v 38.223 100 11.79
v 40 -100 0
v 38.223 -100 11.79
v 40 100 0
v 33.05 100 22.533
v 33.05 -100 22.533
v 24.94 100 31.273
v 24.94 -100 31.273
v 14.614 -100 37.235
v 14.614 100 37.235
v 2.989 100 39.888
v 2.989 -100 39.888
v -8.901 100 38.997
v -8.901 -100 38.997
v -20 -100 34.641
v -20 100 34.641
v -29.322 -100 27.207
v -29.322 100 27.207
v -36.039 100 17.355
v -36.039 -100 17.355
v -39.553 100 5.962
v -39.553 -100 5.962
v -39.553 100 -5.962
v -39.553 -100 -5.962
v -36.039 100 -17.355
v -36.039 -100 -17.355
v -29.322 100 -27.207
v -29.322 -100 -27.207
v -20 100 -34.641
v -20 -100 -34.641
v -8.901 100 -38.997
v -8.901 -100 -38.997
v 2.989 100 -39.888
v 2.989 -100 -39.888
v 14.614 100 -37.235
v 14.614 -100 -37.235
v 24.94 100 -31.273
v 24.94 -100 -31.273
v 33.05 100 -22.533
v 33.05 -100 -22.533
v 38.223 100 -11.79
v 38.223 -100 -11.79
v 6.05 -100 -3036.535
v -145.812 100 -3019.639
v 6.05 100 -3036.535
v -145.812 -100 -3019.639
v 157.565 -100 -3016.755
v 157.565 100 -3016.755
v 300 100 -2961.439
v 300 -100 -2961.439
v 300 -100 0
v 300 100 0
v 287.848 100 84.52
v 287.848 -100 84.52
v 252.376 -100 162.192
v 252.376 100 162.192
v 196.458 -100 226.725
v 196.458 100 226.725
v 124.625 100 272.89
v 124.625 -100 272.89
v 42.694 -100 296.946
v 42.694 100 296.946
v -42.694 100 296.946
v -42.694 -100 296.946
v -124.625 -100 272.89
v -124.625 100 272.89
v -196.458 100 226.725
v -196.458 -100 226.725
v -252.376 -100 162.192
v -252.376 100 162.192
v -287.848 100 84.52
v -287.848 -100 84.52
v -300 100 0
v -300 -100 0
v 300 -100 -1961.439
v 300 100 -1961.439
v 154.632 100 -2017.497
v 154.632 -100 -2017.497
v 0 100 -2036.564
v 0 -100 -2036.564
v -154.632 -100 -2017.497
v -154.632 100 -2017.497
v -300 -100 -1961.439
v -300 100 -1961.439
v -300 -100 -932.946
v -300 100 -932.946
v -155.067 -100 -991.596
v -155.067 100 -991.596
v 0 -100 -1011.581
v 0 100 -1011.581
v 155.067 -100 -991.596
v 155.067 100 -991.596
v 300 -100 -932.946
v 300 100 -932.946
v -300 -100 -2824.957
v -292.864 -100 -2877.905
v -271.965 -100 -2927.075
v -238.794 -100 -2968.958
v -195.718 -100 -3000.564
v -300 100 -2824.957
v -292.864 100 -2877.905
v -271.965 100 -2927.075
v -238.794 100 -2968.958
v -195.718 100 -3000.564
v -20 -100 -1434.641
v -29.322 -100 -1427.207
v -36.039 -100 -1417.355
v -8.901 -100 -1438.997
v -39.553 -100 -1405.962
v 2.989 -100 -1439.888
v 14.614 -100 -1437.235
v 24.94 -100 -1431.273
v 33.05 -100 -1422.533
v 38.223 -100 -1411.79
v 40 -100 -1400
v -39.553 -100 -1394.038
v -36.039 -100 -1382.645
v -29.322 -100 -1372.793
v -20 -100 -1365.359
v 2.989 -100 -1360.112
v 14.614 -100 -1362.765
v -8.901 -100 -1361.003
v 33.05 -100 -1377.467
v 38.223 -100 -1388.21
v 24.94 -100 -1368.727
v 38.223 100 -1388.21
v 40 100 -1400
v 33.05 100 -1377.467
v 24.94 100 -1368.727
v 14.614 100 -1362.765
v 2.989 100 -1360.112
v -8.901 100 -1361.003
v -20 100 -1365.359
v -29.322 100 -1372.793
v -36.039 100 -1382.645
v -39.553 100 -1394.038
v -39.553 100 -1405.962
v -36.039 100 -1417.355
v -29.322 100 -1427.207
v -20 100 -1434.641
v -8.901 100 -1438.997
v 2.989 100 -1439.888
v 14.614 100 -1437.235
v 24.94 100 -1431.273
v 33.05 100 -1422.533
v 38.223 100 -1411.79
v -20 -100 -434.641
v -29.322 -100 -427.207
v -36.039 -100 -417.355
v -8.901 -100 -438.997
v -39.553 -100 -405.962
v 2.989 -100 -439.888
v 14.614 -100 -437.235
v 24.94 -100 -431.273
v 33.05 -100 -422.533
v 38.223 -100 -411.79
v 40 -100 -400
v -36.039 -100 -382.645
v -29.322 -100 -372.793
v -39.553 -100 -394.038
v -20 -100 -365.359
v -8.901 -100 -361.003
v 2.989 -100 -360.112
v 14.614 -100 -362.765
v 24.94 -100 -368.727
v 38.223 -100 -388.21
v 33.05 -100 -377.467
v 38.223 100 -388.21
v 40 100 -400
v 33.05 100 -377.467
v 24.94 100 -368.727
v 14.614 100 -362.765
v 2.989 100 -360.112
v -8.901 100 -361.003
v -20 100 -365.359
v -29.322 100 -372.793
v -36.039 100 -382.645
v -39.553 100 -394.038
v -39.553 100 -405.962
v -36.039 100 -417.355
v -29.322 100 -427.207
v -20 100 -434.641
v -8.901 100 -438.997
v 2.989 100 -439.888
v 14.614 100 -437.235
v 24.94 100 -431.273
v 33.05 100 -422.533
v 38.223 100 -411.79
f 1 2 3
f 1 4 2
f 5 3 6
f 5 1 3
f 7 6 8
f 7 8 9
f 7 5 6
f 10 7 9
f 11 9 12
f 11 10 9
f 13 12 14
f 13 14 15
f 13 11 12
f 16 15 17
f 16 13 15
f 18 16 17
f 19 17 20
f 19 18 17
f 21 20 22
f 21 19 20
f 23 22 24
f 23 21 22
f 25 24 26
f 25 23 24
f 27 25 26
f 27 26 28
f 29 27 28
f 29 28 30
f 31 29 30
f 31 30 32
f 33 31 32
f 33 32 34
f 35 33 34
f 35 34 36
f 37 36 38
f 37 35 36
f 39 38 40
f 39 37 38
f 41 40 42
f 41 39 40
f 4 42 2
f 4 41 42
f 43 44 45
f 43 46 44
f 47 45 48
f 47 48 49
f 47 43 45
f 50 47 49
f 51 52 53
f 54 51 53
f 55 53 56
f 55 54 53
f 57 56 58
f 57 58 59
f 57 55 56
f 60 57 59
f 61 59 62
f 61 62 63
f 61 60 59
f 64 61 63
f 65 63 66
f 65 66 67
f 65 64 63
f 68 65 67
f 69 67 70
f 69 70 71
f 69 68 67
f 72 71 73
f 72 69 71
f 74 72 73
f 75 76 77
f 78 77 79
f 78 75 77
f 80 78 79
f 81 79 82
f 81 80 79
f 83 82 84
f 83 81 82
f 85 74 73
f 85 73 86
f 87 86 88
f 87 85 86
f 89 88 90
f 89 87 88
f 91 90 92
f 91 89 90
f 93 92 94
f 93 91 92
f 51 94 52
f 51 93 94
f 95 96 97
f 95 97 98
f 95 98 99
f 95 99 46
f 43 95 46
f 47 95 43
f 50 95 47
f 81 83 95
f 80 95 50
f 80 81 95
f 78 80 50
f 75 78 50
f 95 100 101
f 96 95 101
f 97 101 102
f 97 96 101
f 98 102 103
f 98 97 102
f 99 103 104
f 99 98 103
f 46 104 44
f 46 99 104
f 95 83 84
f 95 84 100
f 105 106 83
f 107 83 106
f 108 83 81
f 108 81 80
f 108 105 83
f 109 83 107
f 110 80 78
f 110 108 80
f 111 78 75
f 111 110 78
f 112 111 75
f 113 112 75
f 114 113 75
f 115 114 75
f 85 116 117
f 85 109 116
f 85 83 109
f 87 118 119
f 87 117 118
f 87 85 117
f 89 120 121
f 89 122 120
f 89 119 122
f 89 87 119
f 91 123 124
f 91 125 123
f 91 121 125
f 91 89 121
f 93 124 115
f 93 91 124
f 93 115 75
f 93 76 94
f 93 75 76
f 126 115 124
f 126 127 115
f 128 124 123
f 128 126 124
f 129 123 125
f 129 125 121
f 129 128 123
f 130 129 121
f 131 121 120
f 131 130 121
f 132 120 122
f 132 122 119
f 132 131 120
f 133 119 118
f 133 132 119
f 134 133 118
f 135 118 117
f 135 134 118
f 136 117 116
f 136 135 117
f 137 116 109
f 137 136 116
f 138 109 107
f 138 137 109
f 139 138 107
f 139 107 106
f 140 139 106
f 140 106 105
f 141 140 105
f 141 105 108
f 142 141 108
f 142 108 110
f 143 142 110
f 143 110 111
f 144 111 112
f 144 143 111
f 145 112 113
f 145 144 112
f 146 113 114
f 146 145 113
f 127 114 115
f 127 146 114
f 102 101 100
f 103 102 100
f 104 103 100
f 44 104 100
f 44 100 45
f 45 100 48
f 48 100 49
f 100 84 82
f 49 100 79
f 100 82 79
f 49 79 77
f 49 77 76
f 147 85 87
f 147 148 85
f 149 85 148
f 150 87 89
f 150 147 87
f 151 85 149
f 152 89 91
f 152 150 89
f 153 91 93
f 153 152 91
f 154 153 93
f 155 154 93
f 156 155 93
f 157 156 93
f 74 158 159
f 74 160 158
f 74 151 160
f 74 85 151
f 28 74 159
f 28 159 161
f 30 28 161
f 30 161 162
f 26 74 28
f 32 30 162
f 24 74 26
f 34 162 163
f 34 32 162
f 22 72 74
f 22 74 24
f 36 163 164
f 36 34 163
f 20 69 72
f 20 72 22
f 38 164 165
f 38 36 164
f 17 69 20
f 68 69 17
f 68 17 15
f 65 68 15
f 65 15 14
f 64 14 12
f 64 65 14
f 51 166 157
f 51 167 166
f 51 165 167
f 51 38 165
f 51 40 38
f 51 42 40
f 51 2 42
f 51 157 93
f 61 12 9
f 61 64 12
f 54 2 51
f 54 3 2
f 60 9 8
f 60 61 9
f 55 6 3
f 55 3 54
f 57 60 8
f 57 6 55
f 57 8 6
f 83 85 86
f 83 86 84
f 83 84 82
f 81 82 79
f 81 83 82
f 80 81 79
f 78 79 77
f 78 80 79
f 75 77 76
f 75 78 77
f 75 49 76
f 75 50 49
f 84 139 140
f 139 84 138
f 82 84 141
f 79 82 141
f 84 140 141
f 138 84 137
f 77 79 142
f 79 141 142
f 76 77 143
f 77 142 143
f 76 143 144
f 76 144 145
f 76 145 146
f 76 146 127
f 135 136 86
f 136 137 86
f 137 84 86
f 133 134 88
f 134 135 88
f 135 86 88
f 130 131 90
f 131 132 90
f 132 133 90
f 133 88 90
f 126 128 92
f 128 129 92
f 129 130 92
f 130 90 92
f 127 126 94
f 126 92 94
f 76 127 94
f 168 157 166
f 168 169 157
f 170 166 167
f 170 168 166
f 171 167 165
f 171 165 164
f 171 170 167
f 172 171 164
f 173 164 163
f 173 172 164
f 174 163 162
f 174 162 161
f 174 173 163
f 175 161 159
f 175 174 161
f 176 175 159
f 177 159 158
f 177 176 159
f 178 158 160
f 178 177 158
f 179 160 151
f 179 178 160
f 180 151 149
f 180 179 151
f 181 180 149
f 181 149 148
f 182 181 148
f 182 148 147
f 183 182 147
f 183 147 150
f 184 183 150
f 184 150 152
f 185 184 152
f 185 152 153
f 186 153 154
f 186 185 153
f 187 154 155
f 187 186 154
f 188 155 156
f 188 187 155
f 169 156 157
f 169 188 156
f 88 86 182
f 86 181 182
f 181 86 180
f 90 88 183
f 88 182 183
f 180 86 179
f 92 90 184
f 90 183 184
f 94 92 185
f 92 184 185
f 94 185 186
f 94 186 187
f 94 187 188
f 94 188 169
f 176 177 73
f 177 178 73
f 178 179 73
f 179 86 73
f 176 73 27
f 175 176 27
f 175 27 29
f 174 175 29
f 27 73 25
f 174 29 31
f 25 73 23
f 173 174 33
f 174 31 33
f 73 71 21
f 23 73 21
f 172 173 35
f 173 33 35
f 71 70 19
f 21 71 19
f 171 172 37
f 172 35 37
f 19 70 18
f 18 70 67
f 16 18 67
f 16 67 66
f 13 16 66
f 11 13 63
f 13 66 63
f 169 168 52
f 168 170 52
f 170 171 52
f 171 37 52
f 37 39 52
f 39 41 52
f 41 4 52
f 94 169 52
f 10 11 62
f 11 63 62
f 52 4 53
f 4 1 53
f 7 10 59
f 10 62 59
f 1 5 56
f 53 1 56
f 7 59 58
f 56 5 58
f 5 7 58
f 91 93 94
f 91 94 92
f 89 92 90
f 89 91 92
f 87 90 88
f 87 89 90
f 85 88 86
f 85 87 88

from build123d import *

# Parameters (mm, degrees)
F0_R     = 40
F1_DEPTH = 100
F2_DEPTH = 100
F3_DEPTH = 100


with BuildPart() as f1:
    # F0 (on Front) → F1 (new body, symmetric)
    with BuildSketch(Plane.XZ):
        with BuildLine():
            Line((300, -932.945894), (300, 0))
            ThreePointArc((300, 0), (0, 300), (-300, 0))
            Line((-300, 0), (-300, -932.945894))
            ThreePointArc((-300, -932.945894), (0, -1011.581005), (300, -932.945894))
        make_face()
        with Locations((0, -400)):
            Circle(F0_R, mode=Mode.SUBTRACT)
        Circle(F0_R, mode=Mode.SUBTRACT)
    extrude(amount=F1_DEPTH, both=True)


with BuildPart() as f2:
    # F0 (on Front) → F2 (new body, symmetric)
    with BuildSketch(Plane.XZ):
        with BuildLine():
            Line((300, -1961.438973), (300, -932.945894))
            ThreePointArc((300, -932.945894), (0, -1011.581005), (-300, -932.945894))
            Line((-300, -932.945894), (-300, -1961.438973))
            ThreePointArc((-300, -1961.438973), (0, -2036.563995), (300, -1961.438973))
        make_face()
        with Locations((0, -1400)):
            Circle(F0_R, mode=Mode.SUBTRACT)
    extrude(amount=F2_DEPTH, both=True)


with BuildPart() as f3:
    # F0 (on Front) → F3 (new body, symmetric)
    with BuildSketch(Plane.XZ):
        with BuildLine():
            Line((300, -2961.438973), (300, -1961.438973))
            ThreePointArc((300, -1961.438973), (0, -2036.563995), (-300, -1961.438973))
            Line((-300, -1961.438973), (-300, -2824.956612))
            ThreePointArc((-300, -2824.956612), (-256.784023, -2949.128953), (-145.812298, -3019.639003))
            ThreePointArc((-145.812298, -3019.639003), (82.403111, -3031.207927), (300, -2961.438973))
        make_face()
    extrude(amount=F3_DEPTH, both=True)


solid = Compound([f1.part, f2.part, f3.part])
